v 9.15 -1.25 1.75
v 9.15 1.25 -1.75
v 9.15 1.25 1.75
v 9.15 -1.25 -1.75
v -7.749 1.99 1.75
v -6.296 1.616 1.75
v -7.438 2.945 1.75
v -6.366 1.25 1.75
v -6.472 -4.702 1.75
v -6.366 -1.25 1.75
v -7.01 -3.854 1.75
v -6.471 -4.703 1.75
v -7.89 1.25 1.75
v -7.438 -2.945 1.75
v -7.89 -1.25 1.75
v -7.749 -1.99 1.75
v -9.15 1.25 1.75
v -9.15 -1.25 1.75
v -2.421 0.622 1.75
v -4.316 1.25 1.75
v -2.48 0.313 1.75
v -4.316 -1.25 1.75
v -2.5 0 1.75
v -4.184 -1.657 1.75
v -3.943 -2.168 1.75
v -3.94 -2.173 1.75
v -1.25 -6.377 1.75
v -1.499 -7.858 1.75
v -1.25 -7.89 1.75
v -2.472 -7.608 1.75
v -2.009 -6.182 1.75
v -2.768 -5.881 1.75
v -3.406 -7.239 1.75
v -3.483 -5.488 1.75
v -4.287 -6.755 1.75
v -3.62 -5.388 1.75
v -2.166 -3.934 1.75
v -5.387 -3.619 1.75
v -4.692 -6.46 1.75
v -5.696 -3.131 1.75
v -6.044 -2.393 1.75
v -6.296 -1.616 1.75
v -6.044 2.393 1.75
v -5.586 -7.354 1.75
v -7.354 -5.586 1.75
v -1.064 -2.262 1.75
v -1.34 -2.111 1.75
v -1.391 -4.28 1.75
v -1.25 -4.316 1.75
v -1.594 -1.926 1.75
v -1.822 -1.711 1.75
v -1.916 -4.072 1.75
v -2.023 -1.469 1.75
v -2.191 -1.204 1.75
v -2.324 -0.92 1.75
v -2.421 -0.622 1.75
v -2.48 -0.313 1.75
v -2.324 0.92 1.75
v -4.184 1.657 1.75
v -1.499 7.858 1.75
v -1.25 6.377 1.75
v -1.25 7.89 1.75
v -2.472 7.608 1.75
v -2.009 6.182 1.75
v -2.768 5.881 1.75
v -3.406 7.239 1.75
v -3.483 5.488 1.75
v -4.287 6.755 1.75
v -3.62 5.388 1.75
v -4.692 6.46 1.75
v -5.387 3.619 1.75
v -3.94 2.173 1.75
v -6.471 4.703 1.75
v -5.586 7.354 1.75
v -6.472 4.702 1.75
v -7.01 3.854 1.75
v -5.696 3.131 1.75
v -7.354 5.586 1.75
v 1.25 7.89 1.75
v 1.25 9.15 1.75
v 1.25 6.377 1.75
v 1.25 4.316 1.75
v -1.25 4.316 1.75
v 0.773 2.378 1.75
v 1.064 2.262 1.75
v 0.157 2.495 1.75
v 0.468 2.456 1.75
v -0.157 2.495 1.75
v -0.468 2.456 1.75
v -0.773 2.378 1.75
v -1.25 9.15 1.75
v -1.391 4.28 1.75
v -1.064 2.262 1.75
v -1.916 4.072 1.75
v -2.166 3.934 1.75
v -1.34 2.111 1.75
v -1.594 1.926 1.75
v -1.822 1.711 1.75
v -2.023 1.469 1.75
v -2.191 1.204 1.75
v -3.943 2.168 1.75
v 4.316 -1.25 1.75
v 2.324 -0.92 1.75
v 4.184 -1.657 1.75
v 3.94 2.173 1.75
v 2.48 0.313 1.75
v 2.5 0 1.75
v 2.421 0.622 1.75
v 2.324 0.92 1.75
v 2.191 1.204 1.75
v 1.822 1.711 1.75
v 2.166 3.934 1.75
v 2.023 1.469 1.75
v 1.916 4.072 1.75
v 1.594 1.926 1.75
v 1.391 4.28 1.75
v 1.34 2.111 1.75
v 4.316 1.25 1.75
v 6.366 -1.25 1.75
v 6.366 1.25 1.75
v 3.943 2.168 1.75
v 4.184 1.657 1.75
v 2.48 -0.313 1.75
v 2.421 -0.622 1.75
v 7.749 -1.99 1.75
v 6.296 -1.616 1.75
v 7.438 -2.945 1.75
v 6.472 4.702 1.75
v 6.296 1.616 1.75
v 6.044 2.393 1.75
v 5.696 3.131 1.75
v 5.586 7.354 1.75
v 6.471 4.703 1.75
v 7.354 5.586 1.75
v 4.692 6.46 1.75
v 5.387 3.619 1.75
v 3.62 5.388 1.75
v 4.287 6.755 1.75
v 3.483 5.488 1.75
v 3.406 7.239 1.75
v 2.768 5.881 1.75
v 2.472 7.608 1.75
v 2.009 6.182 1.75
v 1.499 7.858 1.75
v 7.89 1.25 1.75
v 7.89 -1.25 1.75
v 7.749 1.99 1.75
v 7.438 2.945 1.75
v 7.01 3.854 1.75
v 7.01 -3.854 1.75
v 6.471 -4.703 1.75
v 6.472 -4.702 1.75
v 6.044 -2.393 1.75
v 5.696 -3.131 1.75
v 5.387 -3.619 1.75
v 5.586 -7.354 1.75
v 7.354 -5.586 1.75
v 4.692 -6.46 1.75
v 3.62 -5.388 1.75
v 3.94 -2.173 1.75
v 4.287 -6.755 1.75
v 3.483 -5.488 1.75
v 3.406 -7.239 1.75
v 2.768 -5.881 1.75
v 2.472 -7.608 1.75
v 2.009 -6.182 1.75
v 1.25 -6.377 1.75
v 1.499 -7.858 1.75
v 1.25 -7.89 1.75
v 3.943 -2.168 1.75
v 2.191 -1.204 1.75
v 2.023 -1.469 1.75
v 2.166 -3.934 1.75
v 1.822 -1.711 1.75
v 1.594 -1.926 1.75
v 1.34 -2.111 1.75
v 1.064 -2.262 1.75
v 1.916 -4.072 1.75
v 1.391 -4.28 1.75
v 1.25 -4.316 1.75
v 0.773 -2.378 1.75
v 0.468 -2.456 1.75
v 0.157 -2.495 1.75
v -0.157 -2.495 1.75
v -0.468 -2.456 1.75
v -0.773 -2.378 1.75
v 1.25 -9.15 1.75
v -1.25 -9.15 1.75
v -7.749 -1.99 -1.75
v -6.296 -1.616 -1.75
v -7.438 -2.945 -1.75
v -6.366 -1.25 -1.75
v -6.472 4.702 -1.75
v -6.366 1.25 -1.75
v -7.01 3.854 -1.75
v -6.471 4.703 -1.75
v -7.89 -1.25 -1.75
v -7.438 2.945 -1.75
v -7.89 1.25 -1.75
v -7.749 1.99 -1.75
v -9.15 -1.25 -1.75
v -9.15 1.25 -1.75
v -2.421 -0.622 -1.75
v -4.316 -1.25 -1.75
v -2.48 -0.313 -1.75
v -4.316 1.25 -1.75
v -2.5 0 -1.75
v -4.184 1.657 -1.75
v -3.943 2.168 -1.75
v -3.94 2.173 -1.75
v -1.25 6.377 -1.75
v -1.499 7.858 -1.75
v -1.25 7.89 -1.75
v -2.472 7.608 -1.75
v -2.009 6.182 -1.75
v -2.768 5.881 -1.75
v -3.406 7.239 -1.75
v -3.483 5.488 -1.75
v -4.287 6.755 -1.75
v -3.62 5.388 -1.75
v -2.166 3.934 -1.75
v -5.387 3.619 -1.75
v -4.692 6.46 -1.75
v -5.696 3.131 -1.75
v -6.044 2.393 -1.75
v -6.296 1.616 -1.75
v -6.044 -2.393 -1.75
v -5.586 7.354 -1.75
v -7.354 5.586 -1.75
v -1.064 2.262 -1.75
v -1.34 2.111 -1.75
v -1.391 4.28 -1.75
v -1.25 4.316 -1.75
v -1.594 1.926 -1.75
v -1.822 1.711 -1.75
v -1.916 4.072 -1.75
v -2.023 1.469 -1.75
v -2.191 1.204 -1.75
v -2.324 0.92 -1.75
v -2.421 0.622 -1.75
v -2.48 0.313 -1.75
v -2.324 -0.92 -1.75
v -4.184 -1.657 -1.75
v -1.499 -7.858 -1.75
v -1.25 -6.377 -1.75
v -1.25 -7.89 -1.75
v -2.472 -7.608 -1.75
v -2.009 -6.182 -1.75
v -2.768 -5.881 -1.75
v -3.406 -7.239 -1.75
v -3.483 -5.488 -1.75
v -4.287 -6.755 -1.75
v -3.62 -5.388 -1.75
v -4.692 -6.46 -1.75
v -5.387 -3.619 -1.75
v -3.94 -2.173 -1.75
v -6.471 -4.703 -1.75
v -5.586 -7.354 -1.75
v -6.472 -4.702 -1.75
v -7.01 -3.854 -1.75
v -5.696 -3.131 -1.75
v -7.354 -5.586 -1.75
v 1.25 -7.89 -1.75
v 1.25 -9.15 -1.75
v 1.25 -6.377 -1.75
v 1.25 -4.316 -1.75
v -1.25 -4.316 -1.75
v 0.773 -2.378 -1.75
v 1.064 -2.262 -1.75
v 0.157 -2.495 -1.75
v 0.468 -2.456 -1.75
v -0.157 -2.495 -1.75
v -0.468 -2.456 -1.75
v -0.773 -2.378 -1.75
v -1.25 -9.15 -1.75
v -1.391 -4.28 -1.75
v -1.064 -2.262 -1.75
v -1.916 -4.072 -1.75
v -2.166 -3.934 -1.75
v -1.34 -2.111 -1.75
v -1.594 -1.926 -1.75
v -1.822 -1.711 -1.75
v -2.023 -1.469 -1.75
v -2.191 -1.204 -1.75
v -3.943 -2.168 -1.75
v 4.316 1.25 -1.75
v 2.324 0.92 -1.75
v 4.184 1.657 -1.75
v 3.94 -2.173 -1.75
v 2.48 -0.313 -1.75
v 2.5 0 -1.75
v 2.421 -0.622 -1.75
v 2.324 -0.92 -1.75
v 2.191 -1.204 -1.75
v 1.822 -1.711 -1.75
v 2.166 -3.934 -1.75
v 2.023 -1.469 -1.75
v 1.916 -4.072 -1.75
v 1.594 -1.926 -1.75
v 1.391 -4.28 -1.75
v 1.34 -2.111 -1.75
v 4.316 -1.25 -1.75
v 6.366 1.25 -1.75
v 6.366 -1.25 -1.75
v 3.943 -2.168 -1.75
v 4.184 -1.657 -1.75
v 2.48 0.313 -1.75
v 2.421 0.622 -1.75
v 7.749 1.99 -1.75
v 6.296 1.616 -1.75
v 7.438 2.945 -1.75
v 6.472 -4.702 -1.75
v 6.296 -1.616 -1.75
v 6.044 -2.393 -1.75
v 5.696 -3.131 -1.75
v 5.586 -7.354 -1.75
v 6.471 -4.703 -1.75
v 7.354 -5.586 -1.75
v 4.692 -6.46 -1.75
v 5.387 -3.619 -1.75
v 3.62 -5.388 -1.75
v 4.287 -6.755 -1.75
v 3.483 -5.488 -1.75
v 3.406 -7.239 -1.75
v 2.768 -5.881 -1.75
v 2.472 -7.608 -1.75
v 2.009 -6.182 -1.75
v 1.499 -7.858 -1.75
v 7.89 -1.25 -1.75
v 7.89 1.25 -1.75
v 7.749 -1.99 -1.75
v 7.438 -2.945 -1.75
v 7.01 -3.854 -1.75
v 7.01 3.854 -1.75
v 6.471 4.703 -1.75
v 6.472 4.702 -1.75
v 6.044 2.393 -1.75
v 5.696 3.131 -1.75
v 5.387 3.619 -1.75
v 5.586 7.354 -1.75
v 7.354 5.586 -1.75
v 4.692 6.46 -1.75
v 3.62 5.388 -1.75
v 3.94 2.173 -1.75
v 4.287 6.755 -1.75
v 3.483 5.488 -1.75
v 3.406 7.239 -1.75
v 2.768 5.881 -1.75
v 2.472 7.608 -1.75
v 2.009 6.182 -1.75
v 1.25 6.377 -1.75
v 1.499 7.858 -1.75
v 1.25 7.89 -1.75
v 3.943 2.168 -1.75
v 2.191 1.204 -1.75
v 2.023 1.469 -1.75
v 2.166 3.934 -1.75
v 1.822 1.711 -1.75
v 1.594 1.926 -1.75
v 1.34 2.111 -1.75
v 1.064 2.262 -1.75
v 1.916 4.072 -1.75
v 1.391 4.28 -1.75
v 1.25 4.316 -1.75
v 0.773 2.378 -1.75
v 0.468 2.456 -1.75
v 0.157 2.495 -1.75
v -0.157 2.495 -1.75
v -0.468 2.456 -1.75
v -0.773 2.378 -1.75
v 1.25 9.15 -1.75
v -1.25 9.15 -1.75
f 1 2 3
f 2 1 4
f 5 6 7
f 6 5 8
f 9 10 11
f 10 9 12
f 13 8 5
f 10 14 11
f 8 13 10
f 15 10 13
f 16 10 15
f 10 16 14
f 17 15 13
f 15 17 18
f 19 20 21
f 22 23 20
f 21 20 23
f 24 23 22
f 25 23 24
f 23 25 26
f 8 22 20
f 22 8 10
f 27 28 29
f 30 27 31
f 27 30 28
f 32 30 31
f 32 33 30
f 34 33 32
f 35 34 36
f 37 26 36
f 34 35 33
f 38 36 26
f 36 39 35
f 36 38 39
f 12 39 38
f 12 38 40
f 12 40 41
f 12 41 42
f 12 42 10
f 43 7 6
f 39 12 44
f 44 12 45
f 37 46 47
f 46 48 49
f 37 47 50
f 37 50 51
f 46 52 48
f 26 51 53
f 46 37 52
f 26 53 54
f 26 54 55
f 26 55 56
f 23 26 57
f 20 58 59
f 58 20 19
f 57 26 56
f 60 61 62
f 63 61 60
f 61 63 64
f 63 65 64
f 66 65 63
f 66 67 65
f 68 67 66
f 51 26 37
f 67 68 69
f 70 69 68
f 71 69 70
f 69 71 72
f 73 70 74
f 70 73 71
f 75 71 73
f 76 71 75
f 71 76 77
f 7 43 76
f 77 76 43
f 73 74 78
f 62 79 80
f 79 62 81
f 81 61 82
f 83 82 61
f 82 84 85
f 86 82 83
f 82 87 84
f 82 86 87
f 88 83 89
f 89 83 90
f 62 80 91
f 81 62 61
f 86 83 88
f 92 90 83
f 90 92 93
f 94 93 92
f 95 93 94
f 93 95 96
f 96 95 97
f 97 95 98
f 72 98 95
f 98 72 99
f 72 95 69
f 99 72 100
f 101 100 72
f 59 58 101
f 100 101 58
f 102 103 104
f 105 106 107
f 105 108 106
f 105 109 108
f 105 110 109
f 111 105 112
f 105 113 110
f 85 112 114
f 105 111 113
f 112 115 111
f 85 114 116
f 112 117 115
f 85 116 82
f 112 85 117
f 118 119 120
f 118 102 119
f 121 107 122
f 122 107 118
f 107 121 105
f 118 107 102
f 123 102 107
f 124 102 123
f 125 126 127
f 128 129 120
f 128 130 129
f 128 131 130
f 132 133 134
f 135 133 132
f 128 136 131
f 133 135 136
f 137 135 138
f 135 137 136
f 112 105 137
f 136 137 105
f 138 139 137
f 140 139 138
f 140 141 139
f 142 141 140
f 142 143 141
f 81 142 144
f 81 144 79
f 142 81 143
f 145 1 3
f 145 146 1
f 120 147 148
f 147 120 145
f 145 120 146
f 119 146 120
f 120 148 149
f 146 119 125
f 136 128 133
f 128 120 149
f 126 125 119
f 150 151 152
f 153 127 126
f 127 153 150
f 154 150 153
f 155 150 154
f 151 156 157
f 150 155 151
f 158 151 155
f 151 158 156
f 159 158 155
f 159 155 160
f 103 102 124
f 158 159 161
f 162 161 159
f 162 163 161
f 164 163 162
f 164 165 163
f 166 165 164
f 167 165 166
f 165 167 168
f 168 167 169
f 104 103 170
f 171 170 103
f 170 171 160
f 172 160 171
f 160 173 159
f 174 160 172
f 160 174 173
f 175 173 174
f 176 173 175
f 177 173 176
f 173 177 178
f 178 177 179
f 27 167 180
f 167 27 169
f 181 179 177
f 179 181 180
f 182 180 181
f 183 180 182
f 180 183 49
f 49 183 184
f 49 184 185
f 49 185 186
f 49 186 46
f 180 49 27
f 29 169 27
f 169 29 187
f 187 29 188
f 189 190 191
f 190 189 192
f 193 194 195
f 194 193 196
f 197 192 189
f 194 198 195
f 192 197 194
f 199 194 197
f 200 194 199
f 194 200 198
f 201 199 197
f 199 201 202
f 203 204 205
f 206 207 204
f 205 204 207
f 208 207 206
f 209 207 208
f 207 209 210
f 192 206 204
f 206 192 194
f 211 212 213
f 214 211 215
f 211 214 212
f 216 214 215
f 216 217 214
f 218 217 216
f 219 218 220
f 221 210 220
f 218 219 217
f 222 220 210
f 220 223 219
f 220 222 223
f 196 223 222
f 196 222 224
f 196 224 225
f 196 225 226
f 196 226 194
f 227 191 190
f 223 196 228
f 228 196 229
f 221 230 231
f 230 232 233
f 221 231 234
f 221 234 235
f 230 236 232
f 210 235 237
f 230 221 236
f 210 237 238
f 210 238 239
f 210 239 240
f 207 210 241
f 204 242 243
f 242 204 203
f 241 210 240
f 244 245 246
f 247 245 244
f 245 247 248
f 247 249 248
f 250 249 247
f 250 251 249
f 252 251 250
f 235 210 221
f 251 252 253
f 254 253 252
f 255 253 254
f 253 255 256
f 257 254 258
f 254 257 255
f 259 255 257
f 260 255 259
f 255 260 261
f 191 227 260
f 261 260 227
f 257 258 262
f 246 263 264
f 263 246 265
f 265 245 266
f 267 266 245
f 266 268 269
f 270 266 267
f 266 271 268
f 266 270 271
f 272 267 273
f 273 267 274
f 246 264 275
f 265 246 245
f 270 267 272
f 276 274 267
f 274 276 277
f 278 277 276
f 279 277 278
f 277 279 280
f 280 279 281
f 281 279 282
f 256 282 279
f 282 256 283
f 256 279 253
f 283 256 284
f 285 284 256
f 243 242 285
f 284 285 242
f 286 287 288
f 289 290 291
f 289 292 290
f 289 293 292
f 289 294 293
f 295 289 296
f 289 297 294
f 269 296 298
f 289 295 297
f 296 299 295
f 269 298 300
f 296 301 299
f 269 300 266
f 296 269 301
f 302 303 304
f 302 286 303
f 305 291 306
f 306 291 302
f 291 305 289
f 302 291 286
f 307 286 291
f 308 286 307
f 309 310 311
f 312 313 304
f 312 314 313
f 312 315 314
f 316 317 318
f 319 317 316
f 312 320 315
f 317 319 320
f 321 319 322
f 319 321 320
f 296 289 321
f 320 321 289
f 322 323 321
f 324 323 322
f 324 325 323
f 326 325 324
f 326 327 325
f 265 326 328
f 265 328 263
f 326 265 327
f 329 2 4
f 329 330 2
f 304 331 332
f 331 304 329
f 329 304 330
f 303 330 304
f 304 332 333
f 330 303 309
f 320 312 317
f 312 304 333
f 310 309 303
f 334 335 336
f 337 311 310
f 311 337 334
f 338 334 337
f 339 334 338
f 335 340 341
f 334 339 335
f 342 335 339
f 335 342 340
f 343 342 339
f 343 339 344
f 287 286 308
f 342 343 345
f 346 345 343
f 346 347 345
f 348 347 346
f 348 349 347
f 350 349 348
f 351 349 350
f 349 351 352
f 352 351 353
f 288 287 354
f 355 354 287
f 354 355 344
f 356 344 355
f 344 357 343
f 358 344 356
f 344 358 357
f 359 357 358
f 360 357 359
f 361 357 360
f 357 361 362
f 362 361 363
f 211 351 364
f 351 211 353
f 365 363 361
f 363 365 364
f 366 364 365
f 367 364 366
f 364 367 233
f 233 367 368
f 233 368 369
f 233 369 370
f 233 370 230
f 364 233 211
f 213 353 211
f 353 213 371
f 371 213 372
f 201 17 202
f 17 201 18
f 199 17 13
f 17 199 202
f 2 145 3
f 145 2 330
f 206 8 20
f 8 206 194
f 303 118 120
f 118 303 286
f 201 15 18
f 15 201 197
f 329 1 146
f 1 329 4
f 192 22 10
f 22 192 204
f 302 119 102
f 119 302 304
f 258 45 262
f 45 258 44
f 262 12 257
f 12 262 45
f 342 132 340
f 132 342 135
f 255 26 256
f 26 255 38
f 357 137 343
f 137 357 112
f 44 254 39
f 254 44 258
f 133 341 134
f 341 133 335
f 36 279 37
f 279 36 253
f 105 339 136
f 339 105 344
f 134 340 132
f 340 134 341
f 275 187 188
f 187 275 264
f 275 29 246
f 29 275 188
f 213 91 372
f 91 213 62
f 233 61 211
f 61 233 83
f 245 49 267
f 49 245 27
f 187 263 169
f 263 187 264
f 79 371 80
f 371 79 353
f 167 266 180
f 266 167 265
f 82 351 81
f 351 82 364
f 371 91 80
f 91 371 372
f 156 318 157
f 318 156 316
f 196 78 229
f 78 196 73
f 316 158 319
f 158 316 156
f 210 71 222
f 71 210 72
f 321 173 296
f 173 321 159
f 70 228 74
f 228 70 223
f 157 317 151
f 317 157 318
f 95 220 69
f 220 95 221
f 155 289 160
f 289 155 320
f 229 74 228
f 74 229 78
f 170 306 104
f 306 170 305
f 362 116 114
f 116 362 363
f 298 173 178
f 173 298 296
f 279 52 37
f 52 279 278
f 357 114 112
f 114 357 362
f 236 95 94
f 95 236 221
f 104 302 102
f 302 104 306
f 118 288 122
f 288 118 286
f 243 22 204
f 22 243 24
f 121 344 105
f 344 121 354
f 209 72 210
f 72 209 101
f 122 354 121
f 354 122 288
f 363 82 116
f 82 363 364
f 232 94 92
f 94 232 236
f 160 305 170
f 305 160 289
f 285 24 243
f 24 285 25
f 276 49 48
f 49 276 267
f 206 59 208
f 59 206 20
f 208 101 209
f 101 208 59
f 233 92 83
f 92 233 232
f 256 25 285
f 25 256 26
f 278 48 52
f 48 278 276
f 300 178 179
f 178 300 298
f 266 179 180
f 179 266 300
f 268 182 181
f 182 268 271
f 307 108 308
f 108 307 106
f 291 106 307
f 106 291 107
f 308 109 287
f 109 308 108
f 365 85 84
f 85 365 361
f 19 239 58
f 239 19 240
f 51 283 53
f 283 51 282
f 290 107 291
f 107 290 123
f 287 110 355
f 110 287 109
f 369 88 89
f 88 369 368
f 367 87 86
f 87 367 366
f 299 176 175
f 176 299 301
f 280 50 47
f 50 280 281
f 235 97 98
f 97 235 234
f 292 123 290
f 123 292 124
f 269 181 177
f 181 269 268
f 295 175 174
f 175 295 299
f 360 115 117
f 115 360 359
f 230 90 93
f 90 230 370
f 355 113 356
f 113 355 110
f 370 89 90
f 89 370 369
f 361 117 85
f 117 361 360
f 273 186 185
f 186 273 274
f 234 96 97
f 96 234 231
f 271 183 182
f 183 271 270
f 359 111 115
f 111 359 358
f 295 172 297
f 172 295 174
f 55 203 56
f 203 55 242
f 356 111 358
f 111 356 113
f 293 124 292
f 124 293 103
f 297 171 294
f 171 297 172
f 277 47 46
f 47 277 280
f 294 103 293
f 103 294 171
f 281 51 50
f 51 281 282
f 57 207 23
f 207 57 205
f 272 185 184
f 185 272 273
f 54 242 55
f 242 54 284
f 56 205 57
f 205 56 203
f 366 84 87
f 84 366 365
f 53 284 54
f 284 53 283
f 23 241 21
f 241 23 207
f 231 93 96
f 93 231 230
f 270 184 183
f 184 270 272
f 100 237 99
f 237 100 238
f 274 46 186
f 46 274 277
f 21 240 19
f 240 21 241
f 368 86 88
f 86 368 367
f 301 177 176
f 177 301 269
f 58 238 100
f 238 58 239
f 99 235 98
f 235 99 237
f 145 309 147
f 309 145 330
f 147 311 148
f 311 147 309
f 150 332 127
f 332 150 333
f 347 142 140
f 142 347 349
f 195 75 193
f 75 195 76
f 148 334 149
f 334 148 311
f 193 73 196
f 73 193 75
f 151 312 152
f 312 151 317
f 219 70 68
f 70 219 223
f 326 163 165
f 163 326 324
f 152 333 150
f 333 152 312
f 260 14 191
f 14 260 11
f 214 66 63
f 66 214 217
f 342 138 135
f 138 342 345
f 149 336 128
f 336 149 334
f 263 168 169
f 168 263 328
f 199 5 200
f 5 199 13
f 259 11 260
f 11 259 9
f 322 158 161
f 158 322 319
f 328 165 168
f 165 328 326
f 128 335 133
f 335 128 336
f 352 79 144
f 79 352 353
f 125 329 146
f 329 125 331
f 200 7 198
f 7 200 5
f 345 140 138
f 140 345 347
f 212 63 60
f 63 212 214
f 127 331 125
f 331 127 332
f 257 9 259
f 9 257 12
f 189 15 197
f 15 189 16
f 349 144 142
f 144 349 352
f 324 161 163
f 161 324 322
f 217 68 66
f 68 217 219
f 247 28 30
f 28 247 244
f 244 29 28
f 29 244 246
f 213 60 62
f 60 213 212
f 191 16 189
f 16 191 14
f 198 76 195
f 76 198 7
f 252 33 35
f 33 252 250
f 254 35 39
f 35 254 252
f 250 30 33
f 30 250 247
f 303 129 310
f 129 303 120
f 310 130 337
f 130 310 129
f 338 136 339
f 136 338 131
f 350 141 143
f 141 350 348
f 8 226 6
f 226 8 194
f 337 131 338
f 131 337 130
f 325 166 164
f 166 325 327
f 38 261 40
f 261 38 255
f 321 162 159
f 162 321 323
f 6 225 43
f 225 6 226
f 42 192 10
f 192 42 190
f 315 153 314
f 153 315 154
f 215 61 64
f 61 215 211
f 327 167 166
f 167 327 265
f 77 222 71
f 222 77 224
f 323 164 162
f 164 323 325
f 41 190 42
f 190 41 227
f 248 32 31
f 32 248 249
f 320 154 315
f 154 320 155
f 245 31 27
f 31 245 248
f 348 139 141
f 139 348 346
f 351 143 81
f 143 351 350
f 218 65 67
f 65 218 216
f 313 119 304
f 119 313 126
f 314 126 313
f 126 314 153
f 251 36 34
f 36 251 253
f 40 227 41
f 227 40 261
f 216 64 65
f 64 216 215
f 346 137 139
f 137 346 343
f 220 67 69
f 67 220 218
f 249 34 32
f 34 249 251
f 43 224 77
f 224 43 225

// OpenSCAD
$fn=50;

difference(){
    union(){
        for(i=[0:7]){
            rotate([0, 0, i * 45]) cube([18.3, 2.5, 3.5], center = true);
        }
        cylinder(d=9, h=3.5, center=true);
    }
    cylinder(d=5, h=7, center=true);
}

difference(){
    cylinder(d=16, h=3.5, center=true);  
    cylinder(d=13, h=7, center=true);    
}
